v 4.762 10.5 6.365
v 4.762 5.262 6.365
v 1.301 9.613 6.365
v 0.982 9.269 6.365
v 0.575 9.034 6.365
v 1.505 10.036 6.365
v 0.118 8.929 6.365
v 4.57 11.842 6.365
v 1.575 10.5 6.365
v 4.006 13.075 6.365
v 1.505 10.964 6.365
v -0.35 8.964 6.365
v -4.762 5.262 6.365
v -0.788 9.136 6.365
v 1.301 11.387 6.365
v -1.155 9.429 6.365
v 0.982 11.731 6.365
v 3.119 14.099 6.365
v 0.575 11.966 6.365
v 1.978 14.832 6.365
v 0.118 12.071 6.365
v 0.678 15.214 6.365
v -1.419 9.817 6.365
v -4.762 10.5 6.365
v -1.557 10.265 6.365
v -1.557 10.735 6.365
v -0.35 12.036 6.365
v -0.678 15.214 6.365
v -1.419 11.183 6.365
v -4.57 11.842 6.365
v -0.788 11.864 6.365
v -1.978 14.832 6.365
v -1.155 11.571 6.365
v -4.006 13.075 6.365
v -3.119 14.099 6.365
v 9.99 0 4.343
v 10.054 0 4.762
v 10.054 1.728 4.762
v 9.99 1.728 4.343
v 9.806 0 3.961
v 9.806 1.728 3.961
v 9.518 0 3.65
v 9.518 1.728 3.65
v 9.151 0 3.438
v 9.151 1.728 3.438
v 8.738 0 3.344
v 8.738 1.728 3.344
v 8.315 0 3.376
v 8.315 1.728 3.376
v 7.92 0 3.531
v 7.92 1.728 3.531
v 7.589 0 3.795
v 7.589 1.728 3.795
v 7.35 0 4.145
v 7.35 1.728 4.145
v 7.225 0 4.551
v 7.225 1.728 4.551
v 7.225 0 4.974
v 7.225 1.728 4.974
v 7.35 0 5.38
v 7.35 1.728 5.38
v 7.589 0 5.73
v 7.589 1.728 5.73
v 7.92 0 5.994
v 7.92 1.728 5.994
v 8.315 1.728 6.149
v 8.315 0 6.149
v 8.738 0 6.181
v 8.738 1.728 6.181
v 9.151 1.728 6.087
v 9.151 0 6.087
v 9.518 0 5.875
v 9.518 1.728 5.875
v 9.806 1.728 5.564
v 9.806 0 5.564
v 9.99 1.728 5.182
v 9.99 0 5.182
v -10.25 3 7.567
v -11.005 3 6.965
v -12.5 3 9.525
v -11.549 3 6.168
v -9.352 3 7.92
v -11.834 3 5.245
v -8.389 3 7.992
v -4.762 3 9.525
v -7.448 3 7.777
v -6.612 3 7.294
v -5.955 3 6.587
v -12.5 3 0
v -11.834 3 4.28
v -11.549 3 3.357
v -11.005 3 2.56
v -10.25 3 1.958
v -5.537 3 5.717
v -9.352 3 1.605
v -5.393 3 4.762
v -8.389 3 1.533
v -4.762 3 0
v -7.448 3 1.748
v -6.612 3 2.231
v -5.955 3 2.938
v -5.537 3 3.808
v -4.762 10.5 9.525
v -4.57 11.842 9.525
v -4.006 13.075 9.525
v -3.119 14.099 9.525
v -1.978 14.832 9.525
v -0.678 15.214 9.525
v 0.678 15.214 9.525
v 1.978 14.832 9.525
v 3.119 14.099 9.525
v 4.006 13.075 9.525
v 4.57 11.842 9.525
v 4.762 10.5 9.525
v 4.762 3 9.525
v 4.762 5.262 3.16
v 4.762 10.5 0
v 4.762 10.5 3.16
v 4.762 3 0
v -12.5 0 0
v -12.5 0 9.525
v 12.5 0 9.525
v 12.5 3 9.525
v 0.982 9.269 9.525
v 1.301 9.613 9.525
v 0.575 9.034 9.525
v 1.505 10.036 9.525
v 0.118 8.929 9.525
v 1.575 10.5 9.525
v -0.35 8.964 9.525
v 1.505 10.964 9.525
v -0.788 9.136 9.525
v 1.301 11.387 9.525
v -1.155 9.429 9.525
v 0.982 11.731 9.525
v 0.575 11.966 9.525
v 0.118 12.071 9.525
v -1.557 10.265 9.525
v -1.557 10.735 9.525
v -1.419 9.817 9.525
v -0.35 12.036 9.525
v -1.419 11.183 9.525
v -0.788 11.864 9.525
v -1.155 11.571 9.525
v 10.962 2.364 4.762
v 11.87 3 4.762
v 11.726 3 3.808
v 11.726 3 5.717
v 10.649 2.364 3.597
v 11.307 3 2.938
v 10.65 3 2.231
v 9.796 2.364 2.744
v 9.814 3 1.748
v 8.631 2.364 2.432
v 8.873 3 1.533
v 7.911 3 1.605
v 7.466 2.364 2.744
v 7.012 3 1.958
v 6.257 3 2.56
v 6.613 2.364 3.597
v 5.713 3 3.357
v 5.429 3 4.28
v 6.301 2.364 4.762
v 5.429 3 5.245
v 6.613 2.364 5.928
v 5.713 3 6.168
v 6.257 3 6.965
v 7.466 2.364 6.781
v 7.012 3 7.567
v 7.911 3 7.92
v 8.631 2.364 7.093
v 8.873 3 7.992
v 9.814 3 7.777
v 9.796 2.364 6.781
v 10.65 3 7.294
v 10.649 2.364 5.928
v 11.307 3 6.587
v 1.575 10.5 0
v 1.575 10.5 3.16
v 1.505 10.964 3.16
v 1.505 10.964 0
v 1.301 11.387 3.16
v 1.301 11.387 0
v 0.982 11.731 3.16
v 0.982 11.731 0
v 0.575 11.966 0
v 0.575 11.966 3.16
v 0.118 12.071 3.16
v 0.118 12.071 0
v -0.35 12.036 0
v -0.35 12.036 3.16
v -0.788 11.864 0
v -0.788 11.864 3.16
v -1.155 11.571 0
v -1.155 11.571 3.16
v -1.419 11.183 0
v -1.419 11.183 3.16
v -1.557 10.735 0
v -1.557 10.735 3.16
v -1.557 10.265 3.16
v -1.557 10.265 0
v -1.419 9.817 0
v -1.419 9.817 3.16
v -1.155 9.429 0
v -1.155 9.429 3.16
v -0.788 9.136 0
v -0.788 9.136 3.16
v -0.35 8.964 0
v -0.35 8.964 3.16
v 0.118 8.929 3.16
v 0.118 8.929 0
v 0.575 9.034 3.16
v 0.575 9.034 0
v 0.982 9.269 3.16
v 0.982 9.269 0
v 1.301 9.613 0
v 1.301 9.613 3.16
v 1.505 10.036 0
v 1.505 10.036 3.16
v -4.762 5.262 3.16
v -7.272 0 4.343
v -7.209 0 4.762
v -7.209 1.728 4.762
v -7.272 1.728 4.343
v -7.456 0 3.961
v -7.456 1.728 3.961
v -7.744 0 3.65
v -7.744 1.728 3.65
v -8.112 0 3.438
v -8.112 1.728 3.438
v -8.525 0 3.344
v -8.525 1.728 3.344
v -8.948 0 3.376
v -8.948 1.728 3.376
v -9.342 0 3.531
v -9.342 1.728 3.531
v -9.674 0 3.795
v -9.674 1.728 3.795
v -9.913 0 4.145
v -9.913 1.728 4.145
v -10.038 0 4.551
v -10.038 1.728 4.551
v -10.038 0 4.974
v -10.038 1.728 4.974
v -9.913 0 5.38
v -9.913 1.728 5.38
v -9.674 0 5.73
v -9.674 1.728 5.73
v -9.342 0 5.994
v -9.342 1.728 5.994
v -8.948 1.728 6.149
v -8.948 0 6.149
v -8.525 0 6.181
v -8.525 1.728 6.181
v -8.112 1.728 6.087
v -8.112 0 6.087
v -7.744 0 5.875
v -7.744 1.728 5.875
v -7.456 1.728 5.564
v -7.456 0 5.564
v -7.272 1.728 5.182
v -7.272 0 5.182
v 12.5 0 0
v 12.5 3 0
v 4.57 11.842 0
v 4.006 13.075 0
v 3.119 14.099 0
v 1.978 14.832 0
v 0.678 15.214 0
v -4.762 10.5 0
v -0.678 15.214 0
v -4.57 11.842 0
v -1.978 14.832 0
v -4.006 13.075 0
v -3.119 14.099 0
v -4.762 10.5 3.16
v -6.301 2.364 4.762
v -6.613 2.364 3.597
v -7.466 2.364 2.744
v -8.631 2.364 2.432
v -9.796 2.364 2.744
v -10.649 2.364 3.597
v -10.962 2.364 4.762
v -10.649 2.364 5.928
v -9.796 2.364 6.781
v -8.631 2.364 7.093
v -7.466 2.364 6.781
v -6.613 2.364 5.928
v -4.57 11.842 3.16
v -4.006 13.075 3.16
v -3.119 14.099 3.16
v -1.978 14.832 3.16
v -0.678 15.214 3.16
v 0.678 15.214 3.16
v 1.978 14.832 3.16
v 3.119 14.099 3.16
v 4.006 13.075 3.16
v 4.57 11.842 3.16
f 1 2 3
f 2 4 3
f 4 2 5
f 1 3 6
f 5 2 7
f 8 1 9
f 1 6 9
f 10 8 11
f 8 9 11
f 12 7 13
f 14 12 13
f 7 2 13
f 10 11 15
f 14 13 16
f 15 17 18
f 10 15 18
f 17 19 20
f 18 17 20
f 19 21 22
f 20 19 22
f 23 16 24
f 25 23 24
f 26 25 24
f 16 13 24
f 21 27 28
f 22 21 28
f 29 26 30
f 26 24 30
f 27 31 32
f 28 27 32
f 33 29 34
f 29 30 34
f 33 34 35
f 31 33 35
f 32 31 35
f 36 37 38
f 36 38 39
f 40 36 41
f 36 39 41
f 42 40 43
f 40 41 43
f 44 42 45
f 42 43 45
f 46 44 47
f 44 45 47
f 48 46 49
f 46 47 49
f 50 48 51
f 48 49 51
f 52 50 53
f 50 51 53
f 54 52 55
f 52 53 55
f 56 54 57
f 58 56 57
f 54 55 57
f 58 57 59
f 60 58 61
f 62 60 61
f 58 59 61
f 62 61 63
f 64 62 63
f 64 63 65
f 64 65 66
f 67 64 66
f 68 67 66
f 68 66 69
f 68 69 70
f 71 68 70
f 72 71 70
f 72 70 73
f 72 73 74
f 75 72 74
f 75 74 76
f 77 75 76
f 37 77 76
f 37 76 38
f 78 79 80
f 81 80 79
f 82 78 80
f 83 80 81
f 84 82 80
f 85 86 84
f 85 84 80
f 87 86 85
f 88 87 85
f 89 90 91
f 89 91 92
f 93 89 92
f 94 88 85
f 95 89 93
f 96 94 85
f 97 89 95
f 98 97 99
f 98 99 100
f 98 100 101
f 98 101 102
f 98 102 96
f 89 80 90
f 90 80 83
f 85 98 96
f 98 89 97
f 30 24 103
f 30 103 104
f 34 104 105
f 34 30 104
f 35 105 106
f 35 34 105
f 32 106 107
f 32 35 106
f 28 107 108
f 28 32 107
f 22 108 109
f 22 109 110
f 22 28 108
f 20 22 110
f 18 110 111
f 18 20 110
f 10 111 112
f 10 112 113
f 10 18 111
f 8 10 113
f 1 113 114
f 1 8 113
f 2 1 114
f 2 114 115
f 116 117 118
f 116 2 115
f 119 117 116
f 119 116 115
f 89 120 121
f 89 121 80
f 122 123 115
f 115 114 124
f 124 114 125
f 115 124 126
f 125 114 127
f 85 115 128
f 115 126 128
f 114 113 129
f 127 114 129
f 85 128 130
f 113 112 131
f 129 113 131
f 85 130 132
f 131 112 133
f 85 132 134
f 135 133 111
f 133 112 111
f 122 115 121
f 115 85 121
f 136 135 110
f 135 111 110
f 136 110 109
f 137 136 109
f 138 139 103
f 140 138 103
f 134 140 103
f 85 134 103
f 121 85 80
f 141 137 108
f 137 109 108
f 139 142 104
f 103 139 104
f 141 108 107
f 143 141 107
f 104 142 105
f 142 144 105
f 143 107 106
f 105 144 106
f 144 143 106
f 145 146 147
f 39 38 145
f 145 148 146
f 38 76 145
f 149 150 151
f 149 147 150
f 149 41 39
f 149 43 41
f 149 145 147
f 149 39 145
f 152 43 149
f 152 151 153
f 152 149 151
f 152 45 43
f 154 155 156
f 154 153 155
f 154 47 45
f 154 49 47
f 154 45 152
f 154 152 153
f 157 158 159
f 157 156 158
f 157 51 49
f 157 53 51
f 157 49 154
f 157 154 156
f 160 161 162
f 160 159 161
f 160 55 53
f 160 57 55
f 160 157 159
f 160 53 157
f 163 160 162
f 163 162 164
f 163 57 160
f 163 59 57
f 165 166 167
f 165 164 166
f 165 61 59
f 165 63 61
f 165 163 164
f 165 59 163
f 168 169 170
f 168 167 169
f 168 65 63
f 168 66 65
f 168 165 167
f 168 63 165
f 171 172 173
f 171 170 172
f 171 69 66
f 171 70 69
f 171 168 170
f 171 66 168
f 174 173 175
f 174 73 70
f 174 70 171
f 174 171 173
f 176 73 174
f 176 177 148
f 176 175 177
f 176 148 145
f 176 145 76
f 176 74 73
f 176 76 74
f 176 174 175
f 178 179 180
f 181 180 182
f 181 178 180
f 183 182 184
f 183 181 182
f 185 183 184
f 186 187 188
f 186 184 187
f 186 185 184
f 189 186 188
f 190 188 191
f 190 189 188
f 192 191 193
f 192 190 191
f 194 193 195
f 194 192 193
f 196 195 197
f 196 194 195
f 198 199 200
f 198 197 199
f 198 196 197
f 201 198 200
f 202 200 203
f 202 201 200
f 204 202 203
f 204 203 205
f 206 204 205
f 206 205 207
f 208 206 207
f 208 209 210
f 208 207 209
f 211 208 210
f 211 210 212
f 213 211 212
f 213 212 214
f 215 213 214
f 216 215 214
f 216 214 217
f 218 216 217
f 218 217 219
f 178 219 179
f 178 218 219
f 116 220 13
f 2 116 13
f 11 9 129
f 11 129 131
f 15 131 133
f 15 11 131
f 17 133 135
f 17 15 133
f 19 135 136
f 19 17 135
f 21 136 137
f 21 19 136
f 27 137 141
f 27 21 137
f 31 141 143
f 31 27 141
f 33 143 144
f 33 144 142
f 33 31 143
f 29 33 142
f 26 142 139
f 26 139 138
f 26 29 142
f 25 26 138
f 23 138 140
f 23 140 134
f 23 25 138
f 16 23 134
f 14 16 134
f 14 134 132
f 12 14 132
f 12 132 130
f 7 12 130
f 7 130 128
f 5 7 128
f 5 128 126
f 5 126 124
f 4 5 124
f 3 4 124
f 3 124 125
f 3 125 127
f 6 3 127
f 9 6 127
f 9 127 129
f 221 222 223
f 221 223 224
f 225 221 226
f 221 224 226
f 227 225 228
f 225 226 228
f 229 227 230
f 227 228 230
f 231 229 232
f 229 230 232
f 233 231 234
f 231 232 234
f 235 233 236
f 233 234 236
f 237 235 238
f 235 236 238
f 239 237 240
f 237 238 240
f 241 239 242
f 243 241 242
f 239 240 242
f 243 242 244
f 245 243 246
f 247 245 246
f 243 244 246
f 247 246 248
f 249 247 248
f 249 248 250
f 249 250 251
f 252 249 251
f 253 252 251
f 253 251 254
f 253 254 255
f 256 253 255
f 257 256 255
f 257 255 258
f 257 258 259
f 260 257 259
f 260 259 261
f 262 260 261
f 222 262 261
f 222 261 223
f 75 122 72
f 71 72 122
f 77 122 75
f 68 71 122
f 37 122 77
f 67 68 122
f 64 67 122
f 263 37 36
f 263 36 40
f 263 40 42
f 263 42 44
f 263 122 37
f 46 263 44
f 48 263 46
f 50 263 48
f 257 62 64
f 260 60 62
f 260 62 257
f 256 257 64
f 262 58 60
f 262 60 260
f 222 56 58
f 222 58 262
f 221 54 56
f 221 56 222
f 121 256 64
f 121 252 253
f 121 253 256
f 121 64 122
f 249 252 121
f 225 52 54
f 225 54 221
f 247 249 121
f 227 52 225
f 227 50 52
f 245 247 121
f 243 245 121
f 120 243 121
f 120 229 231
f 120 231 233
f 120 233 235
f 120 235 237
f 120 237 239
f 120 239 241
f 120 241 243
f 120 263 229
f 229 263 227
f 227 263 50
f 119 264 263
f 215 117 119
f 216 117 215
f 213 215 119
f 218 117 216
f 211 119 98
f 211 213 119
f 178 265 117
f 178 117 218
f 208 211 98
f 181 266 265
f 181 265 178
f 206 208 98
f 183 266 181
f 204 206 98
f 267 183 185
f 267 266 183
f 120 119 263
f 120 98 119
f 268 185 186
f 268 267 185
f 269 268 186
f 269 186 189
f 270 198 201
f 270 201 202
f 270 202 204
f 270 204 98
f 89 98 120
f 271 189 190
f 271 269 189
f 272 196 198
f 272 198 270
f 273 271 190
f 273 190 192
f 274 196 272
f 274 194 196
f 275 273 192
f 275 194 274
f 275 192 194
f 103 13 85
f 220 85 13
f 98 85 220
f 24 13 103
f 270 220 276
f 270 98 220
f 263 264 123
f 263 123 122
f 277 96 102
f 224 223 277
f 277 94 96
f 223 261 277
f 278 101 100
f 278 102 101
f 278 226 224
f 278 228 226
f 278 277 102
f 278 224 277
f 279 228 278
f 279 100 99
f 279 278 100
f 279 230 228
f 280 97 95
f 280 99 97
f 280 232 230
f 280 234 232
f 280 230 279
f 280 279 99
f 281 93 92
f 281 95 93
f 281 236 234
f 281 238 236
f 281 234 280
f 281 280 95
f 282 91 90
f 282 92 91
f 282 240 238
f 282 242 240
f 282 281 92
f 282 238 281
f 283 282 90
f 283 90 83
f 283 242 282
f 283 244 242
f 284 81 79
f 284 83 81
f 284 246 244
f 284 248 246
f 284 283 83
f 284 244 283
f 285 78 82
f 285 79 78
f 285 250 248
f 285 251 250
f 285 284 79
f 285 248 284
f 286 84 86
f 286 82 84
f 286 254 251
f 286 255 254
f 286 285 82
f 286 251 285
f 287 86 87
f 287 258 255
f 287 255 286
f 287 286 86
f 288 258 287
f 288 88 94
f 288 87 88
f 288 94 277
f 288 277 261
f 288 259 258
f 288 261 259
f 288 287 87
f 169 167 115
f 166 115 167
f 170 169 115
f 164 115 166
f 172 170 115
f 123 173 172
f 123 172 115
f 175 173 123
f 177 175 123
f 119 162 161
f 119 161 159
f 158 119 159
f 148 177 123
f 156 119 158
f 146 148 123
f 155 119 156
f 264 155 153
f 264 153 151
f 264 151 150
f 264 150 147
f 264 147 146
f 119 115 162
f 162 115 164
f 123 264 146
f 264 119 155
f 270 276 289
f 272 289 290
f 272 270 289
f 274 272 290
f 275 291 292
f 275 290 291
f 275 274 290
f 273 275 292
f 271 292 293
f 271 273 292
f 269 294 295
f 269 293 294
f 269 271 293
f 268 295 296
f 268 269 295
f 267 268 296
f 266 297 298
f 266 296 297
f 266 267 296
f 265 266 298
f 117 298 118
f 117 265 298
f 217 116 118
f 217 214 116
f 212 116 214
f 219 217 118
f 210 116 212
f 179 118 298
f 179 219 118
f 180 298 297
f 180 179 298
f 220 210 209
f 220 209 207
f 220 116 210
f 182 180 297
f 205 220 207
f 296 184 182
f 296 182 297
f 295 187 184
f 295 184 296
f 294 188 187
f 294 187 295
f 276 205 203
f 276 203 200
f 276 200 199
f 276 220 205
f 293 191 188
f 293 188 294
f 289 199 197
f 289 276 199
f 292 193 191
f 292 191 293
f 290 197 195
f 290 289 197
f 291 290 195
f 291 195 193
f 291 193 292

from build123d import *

# Parameters (mm, degrees)
SKETCH1_R           = 1.575
BOSS_EXTRUDE1_DEPTH = 9.525
SKETCH2_W           = 3.205
SKETCH2_H           = 10
CUT_EXTRUDE4_DEPTH  = 9.525
SKETCH4_R           = 1.4224
CUT_EXTRUDE5_DEPTH  = 3
SKETCH5_R           = 3.2385
CUT_EXTRUDE6_DEPTH  = 2.2
CUT_EXTRUDE6_TAPER  = 55


with BuildPart() as part:
    # Sketch1 → Boss-Extrude1 (new body)
    with BuildSketch(Plane.XY):
        with BuildLine():
            Line((4.7625, 10.5), (4.7625, 3))
            Line((4.7625, 3), (12.5, 3))
            Line((12.5, 3), (12.5, 0))
            Line((12.5, 0), (-12.5, 0))
            Line((-12.5, 0), (-12.5, 3))
            Line((-12.5, 3), (-4.7625, 3))
            Line((-4.7625, 3), (-4.7625, 10.5))
            ThreePointArc((-4.7625, 10.5), (0, 15.2625), (4.7625, 10.5))
        make_face()
        with Locations((0, 10.5)):
            Circle(SKETCH1_R, mode=Mode.SUBTRACT)
    extrude(amount=BOSS_EXTRUDE1_DEPTH)

    # Sketch2 → Cut-Extrude4 (cut)
    with BuildSketch(Plane.ZY.offset(4.7625)):
        with Locations((4.7625, 10.2625)):
            Rectangle(SKETCH2_W, SKETCH2_H)
    extrude(amount=-CUT_EXTRUDE4_DEPTH, mode=Mode.SUBTRACT)

    # Sketch4 → Cut-Extrude5 (cut)
    with BuildSketch(Plane(origin=(0, 3, 0), x_dir=(1, 0, 0), z_dir=(0, 1, 0))):
        with Locations((8.63125, -4.7625)):
            Circle(SKETCH4_R)
        with Locations((-8.63125, -4.7625)):
            Circle(SKETCH4_R)
    extrude(amount=-CUT_EXTRUDE5_DEPTH, mode=Mode.SUBTRACT)

    # Sketch5 → Cut-Extrude6 (cut)
    with BuildSketch(Plane(origin=(0, 3, 0), x_dir=(1, 0, 0), z_dir=(0, 1, 0))):
        with Locations((8.63125, -4.7625)):
            Circle(SKETCH5_R)
        with Locations((-8.63125, -4.7625)):
            Circle(SKETCH5_R)
    extrude(amount=-CUT_EXTRUDE6_DEPTH, taper=CUT_EXTRUDE6_TAPER, mode=Mode.SUBTRACT)


solid = part.part
